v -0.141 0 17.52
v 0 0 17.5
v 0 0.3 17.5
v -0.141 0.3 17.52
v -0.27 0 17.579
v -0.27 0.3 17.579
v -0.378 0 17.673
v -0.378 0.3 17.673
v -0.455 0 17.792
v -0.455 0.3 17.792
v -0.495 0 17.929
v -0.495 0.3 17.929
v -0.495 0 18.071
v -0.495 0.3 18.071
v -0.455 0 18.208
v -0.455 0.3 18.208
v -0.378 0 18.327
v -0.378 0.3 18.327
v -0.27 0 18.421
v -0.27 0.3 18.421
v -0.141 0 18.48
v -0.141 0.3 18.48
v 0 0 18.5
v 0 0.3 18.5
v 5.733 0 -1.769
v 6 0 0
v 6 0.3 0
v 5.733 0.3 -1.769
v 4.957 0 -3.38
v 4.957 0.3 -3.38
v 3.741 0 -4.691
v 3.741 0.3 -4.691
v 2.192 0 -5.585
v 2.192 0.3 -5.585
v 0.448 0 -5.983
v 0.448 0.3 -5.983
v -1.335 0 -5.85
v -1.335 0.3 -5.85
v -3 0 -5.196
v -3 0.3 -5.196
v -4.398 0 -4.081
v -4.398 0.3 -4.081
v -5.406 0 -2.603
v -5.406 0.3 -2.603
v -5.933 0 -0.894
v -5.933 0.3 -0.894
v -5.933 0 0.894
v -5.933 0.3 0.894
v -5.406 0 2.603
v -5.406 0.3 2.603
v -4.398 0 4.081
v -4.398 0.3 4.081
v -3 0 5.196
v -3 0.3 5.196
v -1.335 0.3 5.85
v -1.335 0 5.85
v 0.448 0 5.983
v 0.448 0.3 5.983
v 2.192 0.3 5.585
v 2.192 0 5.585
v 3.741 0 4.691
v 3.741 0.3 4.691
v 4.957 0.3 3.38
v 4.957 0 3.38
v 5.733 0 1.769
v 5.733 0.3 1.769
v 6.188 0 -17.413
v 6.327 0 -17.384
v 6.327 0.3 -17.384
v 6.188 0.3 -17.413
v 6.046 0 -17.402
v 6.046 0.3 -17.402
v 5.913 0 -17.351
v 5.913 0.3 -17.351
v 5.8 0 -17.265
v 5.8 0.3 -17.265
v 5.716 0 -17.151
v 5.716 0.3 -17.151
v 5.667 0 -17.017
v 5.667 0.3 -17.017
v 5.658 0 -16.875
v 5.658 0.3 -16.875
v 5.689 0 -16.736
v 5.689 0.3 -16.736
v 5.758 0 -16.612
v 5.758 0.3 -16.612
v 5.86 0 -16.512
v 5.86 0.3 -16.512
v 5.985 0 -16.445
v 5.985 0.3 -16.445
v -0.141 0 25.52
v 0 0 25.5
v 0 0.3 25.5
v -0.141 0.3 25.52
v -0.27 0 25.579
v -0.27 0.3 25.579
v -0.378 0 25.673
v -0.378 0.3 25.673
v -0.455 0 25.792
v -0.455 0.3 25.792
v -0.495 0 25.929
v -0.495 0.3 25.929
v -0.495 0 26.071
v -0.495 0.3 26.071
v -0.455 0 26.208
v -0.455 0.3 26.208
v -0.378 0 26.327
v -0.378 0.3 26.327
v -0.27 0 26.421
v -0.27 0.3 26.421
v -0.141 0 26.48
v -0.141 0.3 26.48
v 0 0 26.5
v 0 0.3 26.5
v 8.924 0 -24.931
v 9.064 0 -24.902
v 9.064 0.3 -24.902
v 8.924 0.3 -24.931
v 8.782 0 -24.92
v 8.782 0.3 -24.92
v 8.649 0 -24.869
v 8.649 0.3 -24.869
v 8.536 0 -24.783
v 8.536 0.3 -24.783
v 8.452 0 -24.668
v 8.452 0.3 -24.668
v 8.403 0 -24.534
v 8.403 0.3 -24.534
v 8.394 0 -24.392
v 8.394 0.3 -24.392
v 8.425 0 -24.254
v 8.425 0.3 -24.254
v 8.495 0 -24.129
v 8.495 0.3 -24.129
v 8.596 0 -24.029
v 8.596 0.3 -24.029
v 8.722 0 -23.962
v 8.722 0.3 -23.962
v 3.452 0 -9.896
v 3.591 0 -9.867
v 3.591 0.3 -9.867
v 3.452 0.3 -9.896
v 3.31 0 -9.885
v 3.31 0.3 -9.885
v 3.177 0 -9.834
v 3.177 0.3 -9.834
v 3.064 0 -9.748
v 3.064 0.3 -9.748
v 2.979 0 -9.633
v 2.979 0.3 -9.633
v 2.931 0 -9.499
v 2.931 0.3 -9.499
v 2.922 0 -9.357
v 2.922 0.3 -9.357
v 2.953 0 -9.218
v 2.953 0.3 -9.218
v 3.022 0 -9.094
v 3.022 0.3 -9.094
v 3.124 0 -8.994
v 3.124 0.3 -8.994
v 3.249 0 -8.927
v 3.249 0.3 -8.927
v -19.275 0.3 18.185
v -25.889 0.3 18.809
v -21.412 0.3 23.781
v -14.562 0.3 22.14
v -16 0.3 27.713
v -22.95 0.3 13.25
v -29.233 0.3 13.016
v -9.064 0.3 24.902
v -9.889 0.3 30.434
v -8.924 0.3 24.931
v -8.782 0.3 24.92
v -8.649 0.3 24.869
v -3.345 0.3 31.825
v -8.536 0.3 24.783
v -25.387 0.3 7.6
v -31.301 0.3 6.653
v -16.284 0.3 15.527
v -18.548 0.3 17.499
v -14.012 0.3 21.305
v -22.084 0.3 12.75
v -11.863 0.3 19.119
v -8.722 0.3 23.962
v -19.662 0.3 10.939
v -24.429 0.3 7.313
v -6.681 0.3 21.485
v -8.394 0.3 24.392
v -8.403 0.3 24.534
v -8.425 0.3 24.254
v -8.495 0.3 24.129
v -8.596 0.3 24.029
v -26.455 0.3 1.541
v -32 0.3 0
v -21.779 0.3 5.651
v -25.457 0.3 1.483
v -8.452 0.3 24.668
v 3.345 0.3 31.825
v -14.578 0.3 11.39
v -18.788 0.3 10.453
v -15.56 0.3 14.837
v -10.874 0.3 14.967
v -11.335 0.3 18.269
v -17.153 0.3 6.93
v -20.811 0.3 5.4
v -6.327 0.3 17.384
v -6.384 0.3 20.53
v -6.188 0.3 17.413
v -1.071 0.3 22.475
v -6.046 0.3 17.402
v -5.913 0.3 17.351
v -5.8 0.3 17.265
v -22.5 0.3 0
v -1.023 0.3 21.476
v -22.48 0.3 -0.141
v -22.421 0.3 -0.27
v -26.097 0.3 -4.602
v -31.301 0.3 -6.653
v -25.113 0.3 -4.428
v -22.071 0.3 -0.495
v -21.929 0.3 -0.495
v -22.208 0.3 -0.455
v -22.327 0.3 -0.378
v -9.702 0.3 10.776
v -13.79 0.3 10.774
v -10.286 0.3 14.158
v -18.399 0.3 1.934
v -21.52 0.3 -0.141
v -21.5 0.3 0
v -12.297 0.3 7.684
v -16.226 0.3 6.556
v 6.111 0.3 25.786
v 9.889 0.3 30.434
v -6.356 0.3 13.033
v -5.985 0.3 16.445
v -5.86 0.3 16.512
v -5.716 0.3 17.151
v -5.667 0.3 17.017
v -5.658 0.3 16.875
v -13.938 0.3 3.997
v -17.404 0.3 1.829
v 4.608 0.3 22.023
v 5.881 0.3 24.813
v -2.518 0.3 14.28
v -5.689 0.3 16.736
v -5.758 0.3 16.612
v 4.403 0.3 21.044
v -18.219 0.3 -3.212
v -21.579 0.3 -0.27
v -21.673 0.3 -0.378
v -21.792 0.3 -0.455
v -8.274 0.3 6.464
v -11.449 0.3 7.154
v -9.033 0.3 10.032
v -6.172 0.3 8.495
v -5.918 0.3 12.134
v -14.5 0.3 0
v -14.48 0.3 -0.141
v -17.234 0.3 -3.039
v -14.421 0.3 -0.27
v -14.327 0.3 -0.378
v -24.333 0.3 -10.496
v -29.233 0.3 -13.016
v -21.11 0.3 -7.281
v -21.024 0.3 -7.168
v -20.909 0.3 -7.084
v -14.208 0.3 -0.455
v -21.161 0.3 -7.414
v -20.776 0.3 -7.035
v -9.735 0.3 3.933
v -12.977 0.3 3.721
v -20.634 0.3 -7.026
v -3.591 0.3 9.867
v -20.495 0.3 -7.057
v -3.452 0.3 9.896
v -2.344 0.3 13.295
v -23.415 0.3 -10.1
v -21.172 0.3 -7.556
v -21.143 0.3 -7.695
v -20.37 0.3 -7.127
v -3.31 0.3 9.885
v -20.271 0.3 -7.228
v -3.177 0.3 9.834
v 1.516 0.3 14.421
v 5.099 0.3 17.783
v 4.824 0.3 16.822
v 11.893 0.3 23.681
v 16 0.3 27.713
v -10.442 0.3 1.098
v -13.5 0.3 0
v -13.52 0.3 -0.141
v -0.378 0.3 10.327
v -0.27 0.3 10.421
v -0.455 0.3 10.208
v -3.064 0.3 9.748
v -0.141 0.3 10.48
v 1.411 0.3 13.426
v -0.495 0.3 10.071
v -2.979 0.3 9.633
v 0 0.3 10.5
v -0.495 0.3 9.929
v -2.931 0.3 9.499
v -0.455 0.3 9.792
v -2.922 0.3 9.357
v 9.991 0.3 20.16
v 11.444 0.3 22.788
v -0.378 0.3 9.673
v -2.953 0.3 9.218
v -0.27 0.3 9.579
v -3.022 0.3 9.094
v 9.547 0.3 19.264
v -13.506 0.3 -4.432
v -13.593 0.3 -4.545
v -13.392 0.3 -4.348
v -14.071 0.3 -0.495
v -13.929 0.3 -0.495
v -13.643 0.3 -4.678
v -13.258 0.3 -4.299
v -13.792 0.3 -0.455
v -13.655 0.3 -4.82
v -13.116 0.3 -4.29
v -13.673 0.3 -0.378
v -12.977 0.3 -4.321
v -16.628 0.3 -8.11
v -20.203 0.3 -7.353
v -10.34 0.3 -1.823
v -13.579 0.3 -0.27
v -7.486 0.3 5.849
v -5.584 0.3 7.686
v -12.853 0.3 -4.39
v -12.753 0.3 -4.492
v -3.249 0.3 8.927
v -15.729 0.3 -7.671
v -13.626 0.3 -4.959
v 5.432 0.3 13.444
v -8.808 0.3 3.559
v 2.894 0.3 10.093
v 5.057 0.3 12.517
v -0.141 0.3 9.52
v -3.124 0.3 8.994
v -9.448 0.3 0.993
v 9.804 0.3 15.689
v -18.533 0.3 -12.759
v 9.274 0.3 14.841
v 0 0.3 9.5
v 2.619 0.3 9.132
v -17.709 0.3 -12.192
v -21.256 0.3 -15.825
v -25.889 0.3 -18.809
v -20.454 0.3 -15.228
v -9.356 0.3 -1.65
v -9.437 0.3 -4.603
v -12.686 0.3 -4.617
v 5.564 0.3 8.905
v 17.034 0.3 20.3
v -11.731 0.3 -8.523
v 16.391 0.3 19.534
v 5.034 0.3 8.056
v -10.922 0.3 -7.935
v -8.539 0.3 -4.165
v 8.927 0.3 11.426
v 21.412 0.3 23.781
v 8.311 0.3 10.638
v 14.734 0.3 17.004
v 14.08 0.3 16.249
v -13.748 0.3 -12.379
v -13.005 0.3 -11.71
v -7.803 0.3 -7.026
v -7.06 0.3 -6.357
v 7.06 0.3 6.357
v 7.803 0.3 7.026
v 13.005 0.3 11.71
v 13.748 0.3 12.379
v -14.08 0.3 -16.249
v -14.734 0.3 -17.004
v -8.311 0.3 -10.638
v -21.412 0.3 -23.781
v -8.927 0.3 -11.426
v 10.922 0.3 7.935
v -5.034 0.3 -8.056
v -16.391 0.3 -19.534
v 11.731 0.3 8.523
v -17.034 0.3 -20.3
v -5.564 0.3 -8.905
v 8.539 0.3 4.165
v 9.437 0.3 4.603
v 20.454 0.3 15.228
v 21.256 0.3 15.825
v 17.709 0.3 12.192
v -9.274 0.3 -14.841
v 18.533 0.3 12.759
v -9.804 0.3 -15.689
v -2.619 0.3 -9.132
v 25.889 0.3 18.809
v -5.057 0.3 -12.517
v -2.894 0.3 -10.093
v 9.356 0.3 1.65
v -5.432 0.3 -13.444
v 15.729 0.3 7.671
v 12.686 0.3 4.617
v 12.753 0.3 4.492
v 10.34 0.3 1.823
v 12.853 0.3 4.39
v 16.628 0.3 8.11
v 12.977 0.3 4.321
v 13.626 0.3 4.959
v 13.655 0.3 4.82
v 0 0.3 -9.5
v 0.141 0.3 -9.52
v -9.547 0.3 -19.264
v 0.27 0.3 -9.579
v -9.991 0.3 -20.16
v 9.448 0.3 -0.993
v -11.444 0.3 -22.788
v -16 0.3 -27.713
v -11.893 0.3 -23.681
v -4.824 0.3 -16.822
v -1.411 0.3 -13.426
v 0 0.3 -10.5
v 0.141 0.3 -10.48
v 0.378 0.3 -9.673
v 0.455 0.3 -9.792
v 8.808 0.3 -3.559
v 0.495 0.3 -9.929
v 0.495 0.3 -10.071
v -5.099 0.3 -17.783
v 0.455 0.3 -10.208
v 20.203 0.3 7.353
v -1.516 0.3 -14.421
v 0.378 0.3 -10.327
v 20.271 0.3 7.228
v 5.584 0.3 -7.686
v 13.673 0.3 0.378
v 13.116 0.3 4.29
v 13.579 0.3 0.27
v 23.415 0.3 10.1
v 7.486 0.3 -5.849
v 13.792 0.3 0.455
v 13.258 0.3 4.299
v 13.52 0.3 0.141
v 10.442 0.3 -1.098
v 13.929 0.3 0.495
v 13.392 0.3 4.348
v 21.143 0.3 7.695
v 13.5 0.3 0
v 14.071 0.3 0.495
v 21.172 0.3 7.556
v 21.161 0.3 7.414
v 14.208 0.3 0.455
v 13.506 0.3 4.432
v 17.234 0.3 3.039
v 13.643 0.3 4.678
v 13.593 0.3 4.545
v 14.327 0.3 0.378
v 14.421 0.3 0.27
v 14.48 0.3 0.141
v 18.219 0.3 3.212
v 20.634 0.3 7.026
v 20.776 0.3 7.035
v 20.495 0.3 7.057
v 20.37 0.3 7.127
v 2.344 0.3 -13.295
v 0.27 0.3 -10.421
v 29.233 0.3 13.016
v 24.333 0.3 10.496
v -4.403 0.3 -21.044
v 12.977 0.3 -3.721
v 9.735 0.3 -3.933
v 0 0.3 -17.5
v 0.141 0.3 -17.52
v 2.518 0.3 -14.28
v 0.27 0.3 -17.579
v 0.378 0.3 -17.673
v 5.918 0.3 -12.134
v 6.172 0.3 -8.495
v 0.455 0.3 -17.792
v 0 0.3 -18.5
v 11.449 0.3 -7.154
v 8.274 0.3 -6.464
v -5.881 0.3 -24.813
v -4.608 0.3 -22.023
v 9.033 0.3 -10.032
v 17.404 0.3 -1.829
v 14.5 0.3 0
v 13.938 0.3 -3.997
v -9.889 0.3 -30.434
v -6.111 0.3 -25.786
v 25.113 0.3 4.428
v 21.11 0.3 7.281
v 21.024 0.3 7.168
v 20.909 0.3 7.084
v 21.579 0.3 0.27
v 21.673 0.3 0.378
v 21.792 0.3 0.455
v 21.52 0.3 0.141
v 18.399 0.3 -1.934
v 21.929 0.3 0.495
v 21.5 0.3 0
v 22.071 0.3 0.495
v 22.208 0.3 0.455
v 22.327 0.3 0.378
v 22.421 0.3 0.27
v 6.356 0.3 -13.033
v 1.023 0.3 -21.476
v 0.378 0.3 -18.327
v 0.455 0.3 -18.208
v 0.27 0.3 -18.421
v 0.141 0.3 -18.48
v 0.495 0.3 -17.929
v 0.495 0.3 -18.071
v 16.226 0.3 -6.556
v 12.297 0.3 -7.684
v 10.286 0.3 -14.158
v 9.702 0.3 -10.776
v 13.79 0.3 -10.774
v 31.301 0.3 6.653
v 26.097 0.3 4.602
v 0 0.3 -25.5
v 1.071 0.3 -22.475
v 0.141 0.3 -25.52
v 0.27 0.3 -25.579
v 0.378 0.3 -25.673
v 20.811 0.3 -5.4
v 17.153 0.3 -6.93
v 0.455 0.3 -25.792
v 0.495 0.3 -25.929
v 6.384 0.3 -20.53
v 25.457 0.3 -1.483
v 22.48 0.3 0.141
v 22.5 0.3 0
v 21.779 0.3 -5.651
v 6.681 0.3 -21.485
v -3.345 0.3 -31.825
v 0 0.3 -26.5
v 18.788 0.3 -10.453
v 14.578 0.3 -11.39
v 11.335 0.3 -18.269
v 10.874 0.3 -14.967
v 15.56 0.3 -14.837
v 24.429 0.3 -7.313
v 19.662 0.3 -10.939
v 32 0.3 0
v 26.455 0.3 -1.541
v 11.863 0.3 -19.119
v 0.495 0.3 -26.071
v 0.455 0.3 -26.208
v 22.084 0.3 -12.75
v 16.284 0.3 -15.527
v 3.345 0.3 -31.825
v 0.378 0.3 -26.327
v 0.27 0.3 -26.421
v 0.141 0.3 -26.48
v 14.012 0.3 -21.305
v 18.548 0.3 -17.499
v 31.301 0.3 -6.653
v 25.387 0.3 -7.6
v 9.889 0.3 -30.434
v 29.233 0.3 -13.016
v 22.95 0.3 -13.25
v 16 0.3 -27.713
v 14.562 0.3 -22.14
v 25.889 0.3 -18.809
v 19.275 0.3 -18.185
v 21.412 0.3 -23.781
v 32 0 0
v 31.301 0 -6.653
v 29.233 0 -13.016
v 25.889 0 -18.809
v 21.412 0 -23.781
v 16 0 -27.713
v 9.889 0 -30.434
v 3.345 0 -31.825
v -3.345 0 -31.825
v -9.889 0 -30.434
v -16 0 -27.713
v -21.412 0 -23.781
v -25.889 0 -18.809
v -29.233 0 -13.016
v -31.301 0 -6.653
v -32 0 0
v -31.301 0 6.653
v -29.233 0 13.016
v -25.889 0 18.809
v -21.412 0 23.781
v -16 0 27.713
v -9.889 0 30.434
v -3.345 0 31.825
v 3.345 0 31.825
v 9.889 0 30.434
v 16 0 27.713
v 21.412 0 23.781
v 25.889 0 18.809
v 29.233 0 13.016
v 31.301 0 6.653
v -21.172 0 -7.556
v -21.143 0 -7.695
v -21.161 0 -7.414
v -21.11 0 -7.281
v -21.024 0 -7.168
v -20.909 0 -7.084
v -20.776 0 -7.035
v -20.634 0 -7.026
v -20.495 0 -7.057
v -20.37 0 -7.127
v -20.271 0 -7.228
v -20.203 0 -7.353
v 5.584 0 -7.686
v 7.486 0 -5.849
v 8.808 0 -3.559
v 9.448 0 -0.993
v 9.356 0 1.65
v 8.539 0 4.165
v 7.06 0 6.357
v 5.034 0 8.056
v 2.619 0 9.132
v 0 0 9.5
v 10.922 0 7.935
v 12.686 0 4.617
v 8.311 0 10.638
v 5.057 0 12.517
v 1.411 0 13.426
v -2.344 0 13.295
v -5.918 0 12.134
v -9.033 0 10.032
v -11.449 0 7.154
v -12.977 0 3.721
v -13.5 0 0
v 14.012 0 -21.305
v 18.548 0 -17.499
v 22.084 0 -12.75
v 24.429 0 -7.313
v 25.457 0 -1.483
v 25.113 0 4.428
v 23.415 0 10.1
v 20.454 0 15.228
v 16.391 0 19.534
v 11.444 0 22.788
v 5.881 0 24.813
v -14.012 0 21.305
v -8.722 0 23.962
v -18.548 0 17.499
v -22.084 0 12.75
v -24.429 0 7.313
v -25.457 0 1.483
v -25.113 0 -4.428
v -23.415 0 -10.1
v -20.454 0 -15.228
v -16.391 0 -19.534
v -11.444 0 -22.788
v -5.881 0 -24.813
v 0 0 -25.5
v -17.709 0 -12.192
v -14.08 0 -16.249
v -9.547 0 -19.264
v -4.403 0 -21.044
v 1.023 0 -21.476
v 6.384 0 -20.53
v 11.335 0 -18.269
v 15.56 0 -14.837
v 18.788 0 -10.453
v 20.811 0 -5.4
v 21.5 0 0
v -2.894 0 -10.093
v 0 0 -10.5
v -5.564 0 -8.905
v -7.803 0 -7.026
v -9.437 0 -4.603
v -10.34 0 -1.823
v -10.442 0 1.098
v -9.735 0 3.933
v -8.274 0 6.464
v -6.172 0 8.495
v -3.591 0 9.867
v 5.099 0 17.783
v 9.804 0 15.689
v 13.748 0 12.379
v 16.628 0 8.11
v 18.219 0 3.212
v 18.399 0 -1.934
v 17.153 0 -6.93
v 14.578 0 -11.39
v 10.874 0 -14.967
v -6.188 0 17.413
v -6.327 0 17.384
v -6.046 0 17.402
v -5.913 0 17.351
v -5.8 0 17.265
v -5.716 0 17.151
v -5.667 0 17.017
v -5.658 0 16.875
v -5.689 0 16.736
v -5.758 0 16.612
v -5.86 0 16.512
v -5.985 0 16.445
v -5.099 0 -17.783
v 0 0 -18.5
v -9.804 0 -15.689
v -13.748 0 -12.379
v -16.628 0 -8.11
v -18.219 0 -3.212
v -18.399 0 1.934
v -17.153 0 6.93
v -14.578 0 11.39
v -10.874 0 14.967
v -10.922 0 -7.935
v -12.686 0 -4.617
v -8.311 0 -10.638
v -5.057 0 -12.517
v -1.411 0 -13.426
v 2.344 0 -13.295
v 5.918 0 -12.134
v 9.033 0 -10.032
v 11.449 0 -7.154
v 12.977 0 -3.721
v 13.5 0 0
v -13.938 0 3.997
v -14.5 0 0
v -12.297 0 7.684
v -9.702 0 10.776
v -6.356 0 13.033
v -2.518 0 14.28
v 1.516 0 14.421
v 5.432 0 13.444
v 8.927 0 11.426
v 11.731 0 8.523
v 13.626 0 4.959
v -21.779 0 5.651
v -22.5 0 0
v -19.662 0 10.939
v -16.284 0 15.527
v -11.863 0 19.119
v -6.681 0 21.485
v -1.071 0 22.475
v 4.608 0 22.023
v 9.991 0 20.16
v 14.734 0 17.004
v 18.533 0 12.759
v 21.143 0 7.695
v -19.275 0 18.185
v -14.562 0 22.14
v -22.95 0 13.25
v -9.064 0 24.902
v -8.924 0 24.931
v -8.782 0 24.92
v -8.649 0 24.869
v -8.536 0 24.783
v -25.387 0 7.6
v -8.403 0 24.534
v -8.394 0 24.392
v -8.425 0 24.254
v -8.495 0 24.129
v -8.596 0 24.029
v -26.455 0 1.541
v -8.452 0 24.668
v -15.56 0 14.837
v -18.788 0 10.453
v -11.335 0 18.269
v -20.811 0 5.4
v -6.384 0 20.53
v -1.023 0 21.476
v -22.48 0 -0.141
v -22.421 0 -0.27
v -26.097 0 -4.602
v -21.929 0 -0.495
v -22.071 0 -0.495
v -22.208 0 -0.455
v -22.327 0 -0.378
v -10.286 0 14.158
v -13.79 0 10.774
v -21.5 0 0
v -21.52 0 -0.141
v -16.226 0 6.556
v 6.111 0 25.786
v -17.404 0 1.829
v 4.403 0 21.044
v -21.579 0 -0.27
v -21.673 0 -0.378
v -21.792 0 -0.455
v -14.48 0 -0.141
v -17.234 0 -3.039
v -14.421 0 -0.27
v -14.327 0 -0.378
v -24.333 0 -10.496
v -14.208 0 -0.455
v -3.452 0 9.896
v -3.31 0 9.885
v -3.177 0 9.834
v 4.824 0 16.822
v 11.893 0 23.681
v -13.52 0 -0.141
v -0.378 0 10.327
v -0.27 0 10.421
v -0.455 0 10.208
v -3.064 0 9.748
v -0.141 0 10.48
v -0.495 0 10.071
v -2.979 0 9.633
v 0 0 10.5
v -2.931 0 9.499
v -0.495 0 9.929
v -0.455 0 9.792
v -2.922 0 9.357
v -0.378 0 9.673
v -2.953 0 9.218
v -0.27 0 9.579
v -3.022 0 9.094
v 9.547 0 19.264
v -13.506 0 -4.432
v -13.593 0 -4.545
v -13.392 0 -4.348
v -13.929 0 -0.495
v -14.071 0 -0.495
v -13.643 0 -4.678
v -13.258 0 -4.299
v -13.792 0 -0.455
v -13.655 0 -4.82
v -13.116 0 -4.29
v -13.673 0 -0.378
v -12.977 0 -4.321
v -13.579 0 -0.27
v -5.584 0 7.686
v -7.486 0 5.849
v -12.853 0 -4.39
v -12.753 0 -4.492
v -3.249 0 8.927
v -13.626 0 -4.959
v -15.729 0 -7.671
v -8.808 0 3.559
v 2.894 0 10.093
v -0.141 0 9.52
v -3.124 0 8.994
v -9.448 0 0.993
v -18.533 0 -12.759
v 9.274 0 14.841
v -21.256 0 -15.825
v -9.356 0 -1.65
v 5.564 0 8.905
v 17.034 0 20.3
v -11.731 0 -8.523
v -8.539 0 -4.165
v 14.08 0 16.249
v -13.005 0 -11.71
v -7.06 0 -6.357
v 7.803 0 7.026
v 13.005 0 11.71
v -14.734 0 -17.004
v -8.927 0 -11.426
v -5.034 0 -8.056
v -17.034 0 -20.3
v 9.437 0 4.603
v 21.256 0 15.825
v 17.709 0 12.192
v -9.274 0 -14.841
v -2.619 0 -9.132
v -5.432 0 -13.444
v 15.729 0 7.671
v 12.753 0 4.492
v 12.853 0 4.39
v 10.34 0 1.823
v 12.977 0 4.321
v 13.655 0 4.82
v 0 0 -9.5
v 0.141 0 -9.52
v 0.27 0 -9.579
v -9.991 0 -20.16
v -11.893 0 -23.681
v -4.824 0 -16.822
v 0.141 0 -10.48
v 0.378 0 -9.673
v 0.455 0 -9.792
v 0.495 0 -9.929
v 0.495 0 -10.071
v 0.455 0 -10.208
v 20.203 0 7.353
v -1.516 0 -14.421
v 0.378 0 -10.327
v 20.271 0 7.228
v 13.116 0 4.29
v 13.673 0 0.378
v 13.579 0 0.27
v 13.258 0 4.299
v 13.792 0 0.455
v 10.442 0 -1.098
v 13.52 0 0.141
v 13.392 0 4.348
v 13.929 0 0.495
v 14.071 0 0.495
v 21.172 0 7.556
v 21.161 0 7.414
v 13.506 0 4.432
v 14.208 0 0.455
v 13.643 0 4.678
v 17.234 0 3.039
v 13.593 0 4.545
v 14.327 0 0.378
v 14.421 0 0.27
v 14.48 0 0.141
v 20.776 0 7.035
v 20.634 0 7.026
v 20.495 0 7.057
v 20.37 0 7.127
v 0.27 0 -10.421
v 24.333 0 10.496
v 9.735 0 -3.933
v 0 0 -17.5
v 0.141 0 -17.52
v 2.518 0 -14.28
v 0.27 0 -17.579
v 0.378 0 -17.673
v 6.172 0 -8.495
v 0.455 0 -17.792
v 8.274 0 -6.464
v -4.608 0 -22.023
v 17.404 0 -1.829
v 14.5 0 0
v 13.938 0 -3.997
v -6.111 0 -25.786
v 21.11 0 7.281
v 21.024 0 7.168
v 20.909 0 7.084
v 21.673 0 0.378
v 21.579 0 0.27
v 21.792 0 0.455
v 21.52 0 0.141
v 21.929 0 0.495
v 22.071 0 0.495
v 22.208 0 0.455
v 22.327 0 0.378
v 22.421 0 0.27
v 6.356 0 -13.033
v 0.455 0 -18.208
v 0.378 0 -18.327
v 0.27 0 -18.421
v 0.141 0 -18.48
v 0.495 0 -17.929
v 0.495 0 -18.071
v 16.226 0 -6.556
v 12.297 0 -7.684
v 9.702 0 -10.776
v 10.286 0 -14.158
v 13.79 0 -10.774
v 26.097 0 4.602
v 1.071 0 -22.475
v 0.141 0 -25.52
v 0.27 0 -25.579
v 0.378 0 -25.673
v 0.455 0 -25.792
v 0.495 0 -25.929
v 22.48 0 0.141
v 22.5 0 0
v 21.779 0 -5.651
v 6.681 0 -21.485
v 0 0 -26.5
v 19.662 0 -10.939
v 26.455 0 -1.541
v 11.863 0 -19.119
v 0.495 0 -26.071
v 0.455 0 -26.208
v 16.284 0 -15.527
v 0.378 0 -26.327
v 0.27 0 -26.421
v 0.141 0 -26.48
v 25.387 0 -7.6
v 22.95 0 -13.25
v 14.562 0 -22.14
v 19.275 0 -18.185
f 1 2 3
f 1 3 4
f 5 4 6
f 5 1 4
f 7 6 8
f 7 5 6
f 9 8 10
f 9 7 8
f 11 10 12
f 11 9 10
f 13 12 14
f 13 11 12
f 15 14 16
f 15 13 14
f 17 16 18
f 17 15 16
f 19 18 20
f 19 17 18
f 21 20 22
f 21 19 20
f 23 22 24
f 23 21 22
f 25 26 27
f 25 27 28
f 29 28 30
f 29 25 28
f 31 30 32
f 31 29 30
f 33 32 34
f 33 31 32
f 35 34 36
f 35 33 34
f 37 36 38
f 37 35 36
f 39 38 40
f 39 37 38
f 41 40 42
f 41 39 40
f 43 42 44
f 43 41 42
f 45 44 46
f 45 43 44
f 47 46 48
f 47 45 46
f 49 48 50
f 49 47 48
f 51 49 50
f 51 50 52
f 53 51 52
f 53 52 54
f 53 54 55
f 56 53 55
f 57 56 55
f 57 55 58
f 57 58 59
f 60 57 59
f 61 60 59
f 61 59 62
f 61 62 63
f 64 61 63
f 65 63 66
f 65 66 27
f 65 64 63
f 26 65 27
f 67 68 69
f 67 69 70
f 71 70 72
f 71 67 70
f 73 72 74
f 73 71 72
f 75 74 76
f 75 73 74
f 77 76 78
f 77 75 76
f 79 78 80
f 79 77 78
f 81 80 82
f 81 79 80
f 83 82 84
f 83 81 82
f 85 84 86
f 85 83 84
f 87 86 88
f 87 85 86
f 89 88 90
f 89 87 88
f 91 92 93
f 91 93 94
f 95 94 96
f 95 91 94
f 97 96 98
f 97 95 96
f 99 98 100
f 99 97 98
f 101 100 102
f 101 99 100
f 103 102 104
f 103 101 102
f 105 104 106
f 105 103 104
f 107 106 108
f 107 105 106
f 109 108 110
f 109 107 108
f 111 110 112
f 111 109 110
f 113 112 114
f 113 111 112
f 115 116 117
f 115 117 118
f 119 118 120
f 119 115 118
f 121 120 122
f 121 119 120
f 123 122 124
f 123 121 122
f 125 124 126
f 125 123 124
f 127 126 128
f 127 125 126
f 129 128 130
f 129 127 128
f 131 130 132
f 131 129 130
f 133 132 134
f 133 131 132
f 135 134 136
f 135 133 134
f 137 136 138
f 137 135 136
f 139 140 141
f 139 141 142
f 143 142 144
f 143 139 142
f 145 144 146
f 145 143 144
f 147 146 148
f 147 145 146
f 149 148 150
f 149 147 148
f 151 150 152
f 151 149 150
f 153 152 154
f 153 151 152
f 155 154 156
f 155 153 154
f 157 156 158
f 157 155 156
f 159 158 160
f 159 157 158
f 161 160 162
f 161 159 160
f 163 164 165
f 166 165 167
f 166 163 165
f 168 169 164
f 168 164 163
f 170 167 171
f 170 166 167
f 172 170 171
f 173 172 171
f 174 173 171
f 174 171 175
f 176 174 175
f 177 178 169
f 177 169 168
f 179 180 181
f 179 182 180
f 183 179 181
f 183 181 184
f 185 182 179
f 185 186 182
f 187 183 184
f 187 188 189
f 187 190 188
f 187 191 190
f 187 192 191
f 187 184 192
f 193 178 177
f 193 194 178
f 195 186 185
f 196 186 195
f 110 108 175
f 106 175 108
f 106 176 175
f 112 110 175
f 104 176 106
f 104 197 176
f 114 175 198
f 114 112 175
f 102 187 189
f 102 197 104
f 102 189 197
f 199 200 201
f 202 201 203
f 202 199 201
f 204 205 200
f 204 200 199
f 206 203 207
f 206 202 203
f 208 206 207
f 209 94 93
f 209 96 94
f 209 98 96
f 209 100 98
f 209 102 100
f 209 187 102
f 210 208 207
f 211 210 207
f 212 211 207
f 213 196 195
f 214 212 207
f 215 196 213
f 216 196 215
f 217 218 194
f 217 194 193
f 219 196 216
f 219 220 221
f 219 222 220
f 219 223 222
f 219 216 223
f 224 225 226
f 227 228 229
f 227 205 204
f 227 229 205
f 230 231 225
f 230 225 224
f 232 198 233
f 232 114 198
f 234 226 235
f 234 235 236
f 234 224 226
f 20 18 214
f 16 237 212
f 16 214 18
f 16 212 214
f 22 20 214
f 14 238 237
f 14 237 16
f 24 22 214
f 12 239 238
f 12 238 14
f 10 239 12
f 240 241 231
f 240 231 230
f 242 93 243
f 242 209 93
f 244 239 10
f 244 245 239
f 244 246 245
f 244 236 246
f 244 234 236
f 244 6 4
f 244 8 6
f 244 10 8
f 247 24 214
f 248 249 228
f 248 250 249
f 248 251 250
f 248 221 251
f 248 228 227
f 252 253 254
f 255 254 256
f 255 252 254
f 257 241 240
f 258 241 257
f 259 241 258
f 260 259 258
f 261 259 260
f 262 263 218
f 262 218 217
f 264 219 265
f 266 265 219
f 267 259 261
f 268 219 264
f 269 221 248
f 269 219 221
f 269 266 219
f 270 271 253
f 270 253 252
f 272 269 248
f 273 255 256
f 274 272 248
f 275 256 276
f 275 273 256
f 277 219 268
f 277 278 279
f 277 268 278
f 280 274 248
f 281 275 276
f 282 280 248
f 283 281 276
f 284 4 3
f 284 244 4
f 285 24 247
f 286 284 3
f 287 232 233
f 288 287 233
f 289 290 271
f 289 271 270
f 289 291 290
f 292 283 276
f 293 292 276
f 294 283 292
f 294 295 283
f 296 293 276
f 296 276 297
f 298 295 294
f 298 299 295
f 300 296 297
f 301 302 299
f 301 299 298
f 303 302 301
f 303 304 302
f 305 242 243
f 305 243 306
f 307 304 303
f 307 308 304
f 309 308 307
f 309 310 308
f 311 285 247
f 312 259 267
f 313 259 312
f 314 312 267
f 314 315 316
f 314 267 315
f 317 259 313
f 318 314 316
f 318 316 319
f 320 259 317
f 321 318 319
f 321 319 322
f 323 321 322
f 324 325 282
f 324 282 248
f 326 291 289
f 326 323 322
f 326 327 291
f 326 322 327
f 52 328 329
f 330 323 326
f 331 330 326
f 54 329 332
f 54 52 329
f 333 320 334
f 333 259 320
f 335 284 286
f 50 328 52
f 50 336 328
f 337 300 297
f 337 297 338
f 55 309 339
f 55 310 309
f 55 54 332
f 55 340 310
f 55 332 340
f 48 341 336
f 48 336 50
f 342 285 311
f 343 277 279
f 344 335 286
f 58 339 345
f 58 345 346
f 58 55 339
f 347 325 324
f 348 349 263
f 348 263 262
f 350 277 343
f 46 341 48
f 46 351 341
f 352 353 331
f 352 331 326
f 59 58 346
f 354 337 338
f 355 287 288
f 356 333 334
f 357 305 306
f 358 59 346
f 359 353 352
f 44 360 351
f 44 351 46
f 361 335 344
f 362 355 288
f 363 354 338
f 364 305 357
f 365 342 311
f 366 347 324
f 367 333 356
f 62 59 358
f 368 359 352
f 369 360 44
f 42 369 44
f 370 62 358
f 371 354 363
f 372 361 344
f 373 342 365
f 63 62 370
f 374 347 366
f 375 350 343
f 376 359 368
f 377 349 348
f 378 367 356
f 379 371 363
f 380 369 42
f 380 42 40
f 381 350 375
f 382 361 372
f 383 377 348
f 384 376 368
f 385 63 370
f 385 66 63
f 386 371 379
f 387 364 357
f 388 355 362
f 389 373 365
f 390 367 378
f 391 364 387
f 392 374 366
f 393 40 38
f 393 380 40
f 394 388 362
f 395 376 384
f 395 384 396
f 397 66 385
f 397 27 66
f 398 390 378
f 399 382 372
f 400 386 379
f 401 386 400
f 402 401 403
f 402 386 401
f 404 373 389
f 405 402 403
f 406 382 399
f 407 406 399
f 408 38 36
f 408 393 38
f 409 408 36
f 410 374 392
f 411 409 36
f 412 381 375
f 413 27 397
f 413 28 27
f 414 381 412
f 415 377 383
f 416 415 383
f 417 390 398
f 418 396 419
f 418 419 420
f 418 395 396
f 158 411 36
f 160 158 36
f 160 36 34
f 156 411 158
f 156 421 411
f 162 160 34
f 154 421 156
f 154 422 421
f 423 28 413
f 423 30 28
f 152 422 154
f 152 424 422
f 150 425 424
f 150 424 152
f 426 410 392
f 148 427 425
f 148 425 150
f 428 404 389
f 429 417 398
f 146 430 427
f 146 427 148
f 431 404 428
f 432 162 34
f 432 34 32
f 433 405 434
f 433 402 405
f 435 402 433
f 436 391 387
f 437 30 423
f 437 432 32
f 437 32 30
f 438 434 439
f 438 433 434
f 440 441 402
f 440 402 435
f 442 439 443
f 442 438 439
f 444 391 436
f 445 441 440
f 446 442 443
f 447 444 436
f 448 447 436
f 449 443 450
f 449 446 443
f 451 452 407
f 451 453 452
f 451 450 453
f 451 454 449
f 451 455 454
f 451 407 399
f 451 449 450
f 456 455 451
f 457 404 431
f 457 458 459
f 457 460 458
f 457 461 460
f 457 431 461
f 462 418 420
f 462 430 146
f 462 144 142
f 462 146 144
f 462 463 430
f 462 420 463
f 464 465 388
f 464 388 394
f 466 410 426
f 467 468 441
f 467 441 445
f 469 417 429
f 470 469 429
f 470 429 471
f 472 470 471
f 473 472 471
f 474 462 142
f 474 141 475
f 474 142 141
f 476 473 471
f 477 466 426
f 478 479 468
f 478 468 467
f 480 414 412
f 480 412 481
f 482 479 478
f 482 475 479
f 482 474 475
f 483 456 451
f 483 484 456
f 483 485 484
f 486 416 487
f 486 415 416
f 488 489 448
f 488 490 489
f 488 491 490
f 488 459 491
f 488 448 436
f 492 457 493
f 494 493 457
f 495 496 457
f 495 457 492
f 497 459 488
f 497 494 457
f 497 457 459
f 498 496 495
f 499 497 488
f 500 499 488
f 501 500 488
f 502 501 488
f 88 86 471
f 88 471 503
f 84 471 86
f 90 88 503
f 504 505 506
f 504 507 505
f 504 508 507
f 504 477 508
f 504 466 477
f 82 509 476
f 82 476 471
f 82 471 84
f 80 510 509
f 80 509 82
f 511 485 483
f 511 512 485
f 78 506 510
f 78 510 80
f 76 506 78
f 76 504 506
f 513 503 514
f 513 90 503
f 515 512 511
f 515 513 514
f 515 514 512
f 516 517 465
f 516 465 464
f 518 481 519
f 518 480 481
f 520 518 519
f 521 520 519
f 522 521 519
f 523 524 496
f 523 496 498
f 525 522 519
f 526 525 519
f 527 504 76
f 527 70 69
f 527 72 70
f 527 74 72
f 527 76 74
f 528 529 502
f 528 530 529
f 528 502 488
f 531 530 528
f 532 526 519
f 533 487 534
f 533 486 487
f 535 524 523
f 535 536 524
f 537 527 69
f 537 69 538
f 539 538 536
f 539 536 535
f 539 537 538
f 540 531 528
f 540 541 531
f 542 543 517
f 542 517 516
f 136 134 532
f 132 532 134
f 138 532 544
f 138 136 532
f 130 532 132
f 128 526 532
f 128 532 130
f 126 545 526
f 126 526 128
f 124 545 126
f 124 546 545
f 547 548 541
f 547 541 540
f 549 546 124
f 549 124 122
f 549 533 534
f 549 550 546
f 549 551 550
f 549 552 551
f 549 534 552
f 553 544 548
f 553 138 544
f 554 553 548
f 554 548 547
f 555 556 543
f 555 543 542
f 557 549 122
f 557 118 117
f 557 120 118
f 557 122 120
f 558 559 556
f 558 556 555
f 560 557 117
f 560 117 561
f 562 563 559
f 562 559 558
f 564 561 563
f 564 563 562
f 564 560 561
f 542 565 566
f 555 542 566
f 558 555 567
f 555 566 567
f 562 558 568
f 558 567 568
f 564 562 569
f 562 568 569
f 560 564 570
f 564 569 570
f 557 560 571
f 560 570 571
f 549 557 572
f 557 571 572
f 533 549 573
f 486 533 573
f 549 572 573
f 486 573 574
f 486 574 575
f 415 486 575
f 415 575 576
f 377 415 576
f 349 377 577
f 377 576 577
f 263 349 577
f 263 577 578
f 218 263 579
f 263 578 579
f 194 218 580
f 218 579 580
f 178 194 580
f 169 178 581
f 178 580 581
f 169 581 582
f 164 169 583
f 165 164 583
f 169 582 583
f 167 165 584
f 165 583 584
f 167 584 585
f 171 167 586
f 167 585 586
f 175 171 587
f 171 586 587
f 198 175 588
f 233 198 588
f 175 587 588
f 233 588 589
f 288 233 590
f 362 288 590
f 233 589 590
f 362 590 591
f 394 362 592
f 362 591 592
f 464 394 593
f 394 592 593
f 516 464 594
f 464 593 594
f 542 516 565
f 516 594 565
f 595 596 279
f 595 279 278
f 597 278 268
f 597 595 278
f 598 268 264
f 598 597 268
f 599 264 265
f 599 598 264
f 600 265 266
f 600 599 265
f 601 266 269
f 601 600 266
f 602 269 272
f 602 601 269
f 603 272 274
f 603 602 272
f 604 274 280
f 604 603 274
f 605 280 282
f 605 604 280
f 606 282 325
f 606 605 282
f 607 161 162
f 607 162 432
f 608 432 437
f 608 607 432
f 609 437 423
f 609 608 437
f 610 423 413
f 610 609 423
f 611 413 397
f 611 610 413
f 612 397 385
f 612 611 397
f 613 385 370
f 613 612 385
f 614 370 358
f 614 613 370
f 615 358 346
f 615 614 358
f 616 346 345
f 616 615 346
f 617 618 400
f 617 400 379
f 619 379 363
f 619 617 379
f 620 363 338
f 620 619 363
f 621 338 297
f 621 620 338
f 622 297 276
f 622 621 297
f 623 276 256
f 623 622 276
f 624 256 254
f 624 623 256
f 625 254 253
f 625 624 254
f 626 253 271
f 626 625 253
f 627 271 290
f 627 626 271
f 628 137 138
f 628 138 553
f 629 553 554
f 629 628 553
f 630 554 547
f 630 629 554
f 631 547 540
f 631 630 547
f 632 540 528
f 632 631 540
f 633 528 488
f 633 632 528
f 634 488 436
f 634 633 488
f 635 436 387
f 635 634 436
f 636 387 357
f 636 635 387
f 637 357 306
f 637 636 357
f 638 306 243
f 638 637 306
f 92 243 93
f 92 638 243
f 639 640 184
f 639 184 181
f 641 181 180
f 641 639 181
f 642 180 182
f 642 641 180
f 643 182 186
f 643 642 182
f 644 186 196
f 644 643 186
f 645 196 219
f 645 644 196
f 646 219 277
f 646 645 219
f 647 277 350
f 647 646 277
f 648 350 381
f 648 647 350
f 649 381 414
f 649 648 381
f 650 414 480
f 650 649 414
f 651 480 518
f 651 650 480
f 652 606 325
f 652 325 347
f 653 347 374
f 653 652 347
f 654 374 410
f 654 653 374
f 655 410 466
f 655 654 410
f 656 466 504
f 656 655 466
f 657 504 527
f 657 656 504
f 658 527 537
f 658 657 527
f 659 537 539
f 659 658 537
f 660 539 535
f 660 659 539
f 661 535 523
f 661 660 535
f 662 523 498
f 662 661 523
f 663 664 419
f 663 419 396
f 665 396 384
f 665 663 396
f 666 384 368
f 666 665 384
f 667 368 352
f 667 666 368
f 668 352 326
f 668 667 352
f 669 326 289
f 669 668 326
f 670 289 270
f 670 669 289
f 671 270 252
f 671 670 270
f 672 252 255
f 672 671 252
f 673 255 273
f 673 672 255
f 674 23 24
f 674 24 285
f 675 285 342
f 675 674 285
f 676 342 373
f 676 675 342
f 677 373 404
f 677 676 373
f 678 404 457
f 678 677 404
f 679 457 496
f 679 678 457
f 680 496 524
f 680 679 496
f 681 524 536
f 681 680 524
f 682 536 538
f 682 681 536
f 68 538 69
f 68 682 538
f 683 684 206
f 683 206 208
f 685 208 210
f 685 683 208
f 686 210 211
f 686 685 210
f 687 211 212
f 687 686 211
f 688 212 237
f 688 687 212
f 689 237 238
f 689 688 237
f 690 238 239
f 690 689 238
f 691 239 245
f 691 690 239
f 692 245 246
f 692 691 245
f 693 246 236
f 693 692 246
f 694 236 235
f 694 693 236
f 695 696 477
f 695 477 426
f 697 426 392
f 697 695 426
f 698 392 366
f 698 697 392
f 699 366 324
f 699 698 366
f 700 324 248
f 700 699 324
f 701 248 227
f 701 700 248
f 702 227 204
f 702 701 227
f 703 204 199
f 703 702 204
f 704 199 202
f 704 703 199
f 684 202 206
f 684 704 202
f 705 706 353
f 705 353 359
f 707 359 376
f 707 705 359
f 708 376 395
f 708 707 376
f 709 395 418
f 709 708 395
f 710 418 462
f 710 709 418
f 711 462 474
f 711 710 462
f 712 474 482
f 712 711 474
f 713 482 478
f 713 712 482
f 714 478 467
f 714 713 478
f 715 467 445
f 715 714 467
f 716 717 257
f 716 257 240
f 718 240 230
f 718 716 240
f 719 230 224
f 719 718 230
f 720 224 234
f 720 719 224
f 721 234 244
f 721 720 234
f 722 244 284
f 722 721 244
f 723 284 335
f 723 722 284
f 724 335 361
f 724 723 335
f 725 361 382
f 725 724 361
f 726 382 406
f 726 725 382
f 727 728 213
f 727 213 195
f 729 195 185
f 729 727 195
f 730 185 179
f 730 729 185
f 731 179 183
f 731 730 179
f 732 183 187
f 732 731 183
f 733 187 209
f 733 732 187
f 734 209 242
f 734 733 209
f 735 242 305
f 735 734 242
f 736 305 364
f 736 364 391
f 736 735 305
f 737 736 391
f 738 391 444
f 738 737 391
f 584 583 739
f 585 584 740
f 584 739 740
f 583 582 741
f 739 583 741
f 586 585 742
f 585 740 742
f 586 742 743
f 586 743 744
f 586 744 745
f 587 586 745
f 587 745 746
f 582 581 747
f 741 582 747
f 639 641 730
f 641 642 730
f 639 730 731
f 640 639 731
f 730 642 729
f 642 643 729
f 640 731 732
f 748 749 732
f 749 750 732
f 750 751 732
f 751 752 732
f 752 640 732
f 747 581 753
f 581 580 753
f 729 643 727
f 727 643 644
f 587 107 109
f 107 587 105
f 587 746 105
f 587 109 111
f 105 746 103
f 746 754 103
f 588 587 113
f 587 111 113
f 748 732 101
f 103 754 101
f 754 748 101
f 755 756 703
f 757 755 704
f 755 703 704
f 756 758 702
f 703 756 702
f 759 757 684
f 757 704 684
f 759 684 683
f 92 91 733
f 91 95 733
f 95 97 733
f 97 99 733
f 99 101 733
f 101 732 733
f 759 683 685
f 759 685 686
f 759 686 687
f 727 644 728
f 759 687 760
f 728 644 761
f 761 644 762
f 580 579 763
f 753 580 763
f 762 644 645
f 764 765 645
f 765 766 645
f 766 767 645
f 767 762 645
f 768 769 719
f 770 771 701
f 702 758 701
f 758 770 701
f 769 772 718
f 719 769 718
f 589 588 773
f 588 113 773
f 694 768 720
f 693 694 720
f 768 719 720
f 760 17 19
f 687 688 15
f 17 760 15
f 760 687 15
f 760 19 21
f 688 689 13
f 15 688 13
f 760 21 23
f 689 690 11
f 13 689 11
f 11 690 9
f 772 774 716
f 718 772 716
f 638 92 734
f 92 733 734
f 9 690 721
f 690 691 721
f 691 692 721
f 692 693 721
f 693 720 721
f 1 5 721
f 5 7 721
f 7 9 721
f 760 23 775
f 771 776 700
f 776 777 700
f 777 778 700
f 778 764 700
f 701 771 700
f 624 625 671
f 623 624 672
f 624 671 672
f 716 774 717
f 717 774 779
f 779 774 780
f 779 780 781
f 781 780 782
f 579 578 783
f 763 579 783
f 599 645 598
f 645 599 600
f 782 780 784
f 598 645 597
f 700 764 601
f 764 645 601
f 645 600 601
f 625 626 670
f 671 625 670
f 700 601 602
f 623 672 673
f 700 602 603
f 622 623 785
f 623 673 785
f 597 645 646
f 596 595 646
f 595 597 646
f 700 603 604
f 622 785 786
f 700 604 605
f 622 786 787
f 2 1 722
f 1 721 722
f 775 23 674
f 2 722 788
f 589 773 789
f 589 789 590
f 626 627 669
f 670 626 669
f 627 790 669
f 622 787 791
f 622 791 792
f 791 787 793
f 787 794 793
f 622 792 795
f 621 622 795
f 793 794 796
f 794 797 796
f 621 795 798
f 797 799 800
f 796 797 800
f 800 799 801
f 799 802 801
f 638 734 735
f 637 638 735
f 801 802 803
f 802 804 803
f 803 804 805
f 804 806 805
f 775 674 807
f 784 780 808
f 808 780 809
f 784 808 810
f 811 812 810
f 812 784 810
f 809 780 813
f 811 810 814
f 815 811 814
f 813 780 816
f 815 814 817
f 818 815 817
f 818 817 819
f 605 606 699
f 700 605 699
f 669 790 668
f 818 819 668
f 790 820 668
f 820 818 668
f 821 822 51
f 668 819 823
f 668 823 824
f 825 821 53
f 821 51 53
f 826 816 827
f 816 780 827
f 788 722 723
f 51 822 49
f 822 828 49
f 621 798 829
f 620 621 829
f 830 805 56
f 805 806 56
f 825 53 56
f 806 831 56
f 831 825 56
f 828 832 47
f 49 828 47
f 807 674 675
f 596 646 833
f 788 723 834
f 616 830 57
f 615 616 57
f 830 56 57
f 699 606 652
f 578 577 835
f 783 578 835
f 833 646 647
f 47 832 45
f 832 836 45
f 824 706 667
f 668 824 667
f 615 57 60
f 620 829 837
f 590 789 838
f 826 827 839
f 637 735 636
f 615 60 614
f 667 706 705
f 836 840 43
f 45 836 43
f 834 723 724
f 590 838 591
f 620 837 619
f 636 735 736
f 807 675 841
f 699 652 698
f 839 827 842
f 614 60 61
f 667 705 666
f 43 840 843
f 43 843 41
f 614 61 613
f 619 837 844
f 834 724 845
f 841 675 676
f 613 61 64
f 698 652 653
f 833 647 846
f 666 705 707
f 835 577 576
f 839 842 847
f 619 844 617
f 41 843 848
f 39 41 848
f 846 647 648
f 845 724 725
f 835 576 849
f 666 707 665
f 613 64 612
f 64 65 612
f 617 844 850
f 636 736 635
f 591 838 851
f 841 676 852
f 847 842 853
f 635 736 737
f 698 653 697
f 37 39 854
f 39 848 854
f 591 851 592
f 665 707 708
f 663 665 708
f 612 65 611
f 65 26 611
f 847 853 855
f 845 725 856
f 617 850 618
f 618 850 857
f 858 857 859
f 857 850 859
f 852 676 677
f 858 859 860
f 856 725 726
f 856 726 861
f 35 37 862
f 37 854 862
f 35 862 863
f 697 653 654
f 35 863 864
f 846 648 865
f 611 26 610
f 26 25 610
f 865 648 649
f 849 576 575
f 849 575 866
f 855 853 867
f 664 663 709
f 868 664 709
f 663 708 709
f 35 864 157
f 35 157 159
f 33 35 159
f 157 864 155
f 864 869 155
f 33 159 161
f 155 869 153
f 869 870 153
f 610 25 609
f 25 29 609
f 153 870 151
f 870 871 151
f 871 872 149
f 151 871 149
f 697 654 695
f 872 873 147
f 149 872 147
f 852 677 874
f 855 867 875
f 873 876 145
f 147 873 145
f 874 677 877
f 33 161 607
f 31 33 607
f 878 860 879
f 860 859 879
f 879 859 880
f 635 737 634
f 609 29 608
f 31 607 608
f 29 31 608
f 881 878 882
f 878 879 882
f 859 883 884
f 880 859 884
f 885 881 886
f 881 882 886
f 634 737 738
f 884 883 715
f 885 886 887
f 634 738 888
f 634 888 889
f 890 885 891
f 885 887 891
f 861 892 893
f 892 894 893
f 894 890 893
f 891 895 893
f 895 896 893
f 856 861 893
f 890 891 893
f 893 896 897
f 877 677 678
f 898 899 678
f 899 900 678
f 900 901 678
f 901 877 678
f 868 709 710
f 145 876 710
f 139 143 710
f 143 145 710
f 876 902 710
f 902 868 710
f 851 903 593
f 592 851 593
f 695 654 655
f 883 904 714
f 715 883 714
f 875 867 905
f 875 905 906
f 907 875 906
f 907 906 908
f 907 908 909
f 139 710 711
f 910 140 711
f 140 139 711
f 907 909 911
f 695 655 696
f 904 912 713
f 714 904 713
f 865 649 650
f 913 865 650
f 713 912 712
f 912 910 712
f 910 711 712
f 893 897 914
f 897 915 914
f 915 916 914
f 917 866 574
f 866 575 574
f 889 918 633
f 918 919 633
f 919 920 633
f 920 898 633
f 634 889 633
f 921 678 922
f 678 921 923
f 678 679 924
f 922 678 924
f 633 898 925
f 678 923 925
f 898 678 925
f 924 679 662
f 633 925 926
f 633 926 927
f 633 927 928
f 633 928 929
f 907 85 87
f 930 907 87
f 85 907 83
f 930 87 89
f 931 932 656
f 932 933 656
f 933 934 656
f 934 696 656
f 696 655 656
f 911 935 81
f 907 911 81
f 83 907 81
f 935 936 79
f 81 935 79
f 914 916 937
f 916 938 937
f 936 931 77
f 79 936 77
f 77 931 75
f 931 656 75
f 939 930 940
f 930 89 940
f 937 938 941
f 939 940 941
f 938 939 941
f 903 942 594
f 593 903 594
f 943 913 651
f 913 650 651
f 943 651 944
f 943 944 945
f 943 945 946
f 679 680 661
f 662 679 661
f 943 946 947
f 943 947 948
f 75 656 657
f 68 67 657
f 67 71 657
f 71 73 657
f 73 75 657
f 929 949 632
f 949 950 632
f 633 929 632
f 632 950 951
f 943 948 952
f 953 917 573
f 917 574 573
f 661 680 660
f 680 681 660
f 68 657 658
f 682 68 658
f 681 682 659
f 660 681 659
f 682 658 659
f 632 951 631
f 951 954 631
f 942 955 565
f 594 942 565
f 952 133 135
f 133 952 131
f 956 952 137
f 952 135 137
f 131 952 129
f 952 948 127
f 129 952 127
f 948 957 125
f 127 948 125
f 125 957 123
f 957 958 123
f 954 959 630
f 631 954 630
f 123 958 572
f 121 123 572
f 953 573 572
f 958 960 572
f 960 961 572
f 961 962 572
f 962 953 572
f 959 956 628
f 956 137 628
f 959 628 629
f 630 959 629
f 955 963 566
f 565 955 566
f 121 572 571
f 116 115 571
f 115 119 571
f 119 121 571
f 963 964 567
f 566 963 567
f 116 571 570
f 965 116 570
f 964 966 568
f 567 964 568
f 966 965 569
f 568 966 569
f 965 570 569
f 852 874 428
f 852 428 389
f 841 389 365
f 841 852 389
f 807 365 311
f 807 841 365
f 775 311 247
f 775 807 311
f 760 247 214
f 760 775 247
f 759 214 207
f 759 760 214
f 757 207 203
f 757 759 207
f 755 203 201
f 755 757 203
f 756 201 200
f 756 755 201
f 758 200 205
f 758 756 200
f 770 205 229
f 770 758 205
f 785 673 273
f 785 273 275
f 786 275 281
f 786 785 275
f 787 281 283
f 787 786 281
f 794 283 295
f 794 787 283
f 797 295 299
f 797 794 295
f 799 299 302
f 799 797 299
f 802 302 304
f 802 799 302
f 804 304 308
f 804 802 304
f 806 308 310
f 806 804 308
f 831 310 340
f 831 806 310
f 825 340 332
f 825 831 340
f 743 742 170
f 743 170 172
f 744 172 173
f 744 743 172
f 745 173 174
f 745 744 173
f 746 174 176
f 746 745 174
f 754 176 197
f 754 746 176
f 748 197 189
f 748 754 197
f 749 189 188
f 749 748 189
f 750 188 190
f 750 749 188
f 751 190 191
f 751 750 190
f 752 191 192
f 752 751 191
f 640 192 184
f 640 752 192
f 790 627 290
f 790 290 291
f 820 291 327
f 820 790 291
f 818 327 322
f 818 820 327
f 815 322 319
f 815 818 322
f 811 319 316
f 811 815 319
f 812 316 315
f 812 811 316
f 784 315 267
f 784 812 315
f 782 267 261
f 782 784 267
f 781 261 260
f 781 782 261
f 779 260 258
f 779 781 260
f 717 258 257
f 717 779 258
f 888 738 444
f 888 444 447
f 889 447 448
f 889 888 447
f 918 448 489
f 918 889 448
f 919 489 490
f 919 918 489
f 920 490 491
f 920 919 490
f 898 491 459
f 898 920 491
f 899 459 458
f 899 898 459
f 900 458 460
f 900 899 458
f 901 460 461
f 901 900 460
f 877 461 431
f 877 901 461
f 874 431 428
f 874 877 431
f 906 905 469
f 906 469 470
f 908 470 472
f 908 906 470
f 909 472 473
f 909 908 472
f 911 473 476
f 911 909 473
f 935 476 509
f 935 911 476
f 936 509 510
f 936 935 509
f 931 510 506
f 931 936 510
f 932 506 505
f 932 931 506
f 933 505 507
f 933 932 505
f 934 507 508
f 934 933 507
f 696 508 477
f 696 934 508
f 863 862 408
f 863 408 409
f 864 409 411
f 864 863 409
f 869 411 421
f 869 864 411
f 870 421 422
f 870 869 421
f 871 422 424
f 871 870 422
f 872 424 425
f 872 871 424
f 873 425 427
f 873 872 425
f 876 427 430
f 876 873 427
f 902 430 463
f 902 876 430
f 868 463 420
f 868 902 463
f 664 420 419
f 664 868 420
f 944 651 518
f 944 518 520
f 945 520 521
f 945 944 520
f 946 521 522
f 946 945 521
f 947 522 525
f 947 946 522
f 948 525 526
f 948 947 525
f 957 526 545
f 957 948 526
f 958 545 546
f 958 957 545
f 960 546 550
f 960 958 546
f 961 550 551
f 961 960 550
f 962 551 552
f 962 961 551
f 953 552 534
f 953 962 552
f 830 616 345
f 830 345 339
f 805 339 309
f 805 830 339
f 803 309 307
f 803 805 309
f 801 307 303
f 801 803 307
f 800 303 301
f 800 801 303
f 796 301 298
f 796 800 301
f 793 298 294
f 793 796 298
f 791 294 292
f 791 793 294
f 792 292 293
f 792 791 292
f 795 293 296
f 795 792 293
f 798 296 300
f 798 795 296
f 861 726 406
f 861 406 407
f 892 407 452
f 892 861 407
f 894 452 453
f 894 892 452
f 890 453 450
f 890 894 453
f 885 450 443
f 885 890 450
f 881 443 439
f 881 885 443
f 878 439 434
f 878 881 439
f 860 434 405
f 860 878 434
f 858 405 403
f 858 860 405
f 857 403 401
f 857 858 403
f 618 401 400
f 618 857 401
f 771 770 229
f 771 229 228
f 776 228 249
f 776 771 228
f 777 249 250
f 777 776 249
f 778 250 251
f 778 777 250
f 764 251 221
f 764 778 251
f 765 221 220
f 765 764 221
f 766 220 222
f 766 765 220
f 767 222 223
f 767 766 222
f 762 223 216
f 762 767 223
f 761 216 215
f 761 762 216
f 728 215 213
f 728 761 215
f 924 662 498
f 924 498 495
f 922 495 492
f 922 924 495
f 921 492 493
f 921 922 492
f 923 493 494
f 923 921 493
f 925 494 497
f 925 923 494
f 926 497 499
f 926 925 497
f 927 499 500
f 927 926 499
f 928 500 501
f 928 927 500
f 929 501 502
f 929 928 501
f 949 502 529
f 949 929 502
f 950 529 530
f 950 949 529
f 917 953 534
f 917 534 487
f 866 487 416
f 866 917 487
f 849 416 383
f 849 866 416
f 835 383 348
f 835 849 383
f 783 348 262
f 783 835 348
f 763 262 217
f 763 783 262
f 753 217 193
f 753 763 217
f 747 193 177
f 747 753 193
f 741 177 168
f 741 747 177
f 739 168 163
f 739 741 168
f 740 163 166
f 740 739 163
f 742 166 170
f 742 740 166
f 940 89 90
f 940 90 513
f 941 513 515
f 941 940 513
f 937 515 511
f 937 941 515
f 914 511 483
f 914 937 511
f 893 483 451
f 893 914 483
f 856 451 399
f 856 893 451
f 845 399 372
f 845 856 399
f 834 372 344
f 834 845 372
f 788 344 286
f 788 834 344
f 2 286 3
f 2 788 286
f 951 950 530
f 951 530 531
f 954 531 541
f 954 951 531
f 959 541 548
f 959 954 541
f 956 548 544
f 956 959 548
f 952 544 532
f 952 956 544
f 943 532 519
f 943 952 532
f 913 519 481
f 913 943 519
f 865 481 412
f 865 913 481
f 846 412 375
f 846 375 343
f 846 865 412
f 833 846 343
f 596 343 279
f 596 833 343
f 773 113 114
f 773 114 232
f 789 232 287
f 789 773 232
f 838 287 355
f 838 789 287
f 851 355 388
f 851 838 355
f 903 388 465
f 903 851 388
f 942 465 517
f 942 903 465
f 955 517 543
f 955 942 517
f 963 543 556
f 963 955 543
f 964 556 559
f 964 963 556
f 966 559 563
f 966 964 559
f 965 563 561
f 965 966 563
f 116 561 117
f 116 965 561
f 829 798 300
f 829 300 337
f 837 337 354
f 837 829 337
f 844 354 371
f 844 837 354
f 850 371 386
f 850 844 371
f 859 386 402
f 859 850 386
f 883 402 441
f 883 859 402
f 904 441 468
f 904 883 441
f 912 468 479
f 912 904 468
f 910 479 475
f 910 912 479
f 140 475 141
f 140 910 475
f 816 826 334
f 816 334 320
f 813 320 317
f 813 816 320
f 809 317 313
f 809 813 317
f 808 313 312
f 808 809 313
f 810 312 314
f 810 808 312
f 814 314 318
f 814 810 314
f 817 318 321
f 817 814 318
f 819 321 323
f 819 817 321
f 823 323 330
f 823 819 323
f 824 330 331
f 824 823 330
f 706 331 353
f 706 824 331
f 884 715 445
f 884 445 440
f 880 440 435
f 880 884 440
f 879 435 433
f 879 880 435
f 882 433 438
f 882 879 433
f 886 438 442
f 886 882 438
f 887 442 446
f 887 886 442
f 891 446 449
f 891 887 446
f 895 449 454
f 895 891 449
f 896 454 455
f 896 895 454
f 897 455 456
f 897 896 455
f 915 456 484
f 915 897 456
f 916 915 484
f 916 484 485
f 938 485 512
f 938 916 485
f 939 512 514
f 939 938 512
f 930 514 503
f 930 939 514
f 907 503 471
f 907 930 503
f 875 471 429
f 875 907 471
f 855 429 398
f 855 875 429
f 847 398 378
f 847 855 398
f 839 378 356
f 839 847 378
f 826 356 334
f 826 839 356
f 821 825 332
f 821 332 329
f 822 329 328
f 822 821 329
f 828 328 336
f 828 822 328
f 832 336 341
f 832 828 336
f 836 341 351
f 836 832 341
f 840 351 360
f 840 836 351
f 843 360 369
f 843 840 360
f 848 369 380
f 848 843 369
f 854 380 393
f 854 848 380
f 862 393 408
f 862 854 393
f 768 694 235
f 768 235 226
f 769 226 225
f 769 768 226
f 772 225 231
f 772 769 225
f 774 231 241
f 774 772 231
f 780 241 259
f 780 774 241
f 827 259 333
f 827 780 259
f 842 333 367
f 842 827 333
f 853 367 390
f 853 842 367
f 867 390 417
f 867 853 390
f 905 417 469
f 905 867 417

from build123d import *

# Parameters (mm, degrees)
SKETCH1_R           = 32
SKETCH1_R_2         = 6
BOSS_EXTRUDE1_DEPTH = 0.3


with BuildPart() as part:
    # Sketch1 → Boss-Extrude1 (new body)
    with BuildSketch(Plane(origin=(0, 0, 0), x_dir=(1, 0, 0), z_dir=(0, 1, 0))):
        Circle(SKETCH1_R)
        Circle(SKETCH1_R_2, mode=Mode.SUBTRACT)
        with BuildLine():
            ThreePointArc((0, 26.5), (-26.097405455, 4.601676708), (-9.063533798, -24.901854451))
            ThreePointArc((-9.063533798, -24.901854451), (-8.422677416, -24.603018212), (-8.721513655, -23.96216183))
            ThreePointArc((-8.721513655, -23.96216183), (-25.112597702, 4.428028531), (0, 25.5))
            ThreePointArc((0, 25.5), (0.5, 26), (0, 26.5))
        make_face(mode=Mode.SUBTRACT)
        with BuildLine():
            ThreePointArc((22.5, 0), (3.907083998, 22.158174443), (-21.143083968, 7.695453225))
            ThreePointArc((-21.143083968, 7.695453225), (-20.844247729, 7.054596843), (-20.203391347, 7.353433082))
            ThreePointArc((-20.203391347, 7.353433082), (3.73343582, 21.17336669), (21.5, 0))
            ThreePointArc((21.5, 0), (22, -0.5), (22.5, 0))
        make_face(mode=Mode.SUBTRACT)
        with BuildLine():
            ThreePointArc((0, -26.5), (26.097405455, -4.601676708), (9.063533798, 24.901854451))
            ThreePointArc((9.063533798, 24.901854451), (8.422677416, 24.603018212), (8.721513655, 23.96216183))
            ThreePointArc((8.721513655, 23.96216183), (25.112597702, -4.428028531), (0, -25.5))
            ThreePointArc((0, -25.5), (-0.5, -26), (0, -26.5))
        make_face(mode=Mode.SUBTRACT)
        with BuildLine():
            ThreePointArc((0, 18.5), (-18.218943431, 3.212491287), (-6.327372652, -17.384313485))
            ThreePointArc((-6.327372652, -17.384313485), (-5.686516269, -17.085477246), (-5.985352508, -16.444620864))
            ThreePointArc((-5.985352508, -16.444620864), (-17.234135678, 3.038843109), (0, 17.5))
            ThreePointArc((0, 17.5), (0.5, 18), (0, 18.5))
        make_face(mode=Mode.SUBTRACT)
        with BuildLine():
            ThreePointArc((14.5, 0), (2.517898576, 14.279712419), (-13.625543001, 4.959292078))
            ThreePointArc((-13.625543001, 4.959292078), (-13.326706763, 4.318435696), (-12.685850381, 4.617271935))
            ThreePointArc((-12.685850381, 4.617271935), (2.344250399, 13.294904666), (13.5, 0))
            ThreePointArc((13.5, 0), (14, -0.5), (14.5, 0))
        make_face(mode=Mode.SUBTRACT)
        with BuildLine():
            ThreePointArc((0, -18.5), (18.218943431, -3.212491287), (6.327372652, 17.384313485))
            ThreePointArc((6.327372652, 17.384313485), (5.686516269, 17.085477246), (5.985352508, 16.444620864))
            ThreePointArc((5.985352508, 16.444620864), (17.234135678, -3.038843109), (0, -17.5))
            ThreePointArc((0, -17.5), (-0.5, -18), (0, -18.5))
        make_face(mode=Mode.SUBTRACT)
        with BuildLine():
            ThreePointArc((0, 10.5), (-10.340481407, 1.823305866), (-3.591211505, -9.866772518))
            ThreePointArc((-3.591211505, -9.866772518), (-2.950355123, -9.56793628), (-3.249191362, -8.927079897))
            ThreePointArc((-3.249191362, -8.927079897), (-9.355673654, 1.649657688), (0, 9.5))
            ThreePointArc((0, 9.5), (0.5, 10), (0, 10.5))
        make_face(mode=Mode.SUBTRACT)
        with BuildLine():
            ThreePointArc((0, -10.5), (10.340481407, -1.823305866), (3.591211505, 9.866772518))
            ThreePointArc((3.591211505, 9.866772518), (2.950355123, 9.56793628), (3.249191362, 8.927079897))
            ThreePointArc((3.249191362, 8.927079897), (9.355673654, -1.649657688), (0, -9.5))
            ThreePointArc((0, -9.5), (-0.5, -10), (0, -10.5))
        make_face(mode=Mode.SUBTRACT)
        with BuildLine():
            ThreePointArc((-14.5, 0), (-2.517898576, -14.279712419), (13.625543001, -4.959292078))
            ThreePointArc((13.625543001, -4.959292078), (13.326706763, -4.318435696), (12.685850381, -4.617271935))
            ThreePointArc((12.685850381, -4.617271935), (-2.344250399, -13.294904666), (-13.5, 0))
            ThreePointArc((-13.5, 0), (-14, 0.5), (-14.5, 0))
        make_face(mode=Mode.SUBTRACT)
        with BuildLine():
            ThreePointArc((-22.5, 0), (-3.907083998, -22.158174443), (21.143083968, -7.695453225))
            ThreePointArc((21.143083968, -7.695453225), (20.844247729, -7.054596843), (20.203391347, -7.353433082))
            ThreePointArc((20.203391347, -7.353433082), (-3.73343582, -21.17336669), (-21.5, 0))
            ThreePointArc((-21.5, 0), (-22, 0.5), (-22.5, 0))
        make_face(mode=Mode.SUBTRACT)
    extrude(amount=BOSS_EXTRUDE1_DEPTH)


solid = part.part
